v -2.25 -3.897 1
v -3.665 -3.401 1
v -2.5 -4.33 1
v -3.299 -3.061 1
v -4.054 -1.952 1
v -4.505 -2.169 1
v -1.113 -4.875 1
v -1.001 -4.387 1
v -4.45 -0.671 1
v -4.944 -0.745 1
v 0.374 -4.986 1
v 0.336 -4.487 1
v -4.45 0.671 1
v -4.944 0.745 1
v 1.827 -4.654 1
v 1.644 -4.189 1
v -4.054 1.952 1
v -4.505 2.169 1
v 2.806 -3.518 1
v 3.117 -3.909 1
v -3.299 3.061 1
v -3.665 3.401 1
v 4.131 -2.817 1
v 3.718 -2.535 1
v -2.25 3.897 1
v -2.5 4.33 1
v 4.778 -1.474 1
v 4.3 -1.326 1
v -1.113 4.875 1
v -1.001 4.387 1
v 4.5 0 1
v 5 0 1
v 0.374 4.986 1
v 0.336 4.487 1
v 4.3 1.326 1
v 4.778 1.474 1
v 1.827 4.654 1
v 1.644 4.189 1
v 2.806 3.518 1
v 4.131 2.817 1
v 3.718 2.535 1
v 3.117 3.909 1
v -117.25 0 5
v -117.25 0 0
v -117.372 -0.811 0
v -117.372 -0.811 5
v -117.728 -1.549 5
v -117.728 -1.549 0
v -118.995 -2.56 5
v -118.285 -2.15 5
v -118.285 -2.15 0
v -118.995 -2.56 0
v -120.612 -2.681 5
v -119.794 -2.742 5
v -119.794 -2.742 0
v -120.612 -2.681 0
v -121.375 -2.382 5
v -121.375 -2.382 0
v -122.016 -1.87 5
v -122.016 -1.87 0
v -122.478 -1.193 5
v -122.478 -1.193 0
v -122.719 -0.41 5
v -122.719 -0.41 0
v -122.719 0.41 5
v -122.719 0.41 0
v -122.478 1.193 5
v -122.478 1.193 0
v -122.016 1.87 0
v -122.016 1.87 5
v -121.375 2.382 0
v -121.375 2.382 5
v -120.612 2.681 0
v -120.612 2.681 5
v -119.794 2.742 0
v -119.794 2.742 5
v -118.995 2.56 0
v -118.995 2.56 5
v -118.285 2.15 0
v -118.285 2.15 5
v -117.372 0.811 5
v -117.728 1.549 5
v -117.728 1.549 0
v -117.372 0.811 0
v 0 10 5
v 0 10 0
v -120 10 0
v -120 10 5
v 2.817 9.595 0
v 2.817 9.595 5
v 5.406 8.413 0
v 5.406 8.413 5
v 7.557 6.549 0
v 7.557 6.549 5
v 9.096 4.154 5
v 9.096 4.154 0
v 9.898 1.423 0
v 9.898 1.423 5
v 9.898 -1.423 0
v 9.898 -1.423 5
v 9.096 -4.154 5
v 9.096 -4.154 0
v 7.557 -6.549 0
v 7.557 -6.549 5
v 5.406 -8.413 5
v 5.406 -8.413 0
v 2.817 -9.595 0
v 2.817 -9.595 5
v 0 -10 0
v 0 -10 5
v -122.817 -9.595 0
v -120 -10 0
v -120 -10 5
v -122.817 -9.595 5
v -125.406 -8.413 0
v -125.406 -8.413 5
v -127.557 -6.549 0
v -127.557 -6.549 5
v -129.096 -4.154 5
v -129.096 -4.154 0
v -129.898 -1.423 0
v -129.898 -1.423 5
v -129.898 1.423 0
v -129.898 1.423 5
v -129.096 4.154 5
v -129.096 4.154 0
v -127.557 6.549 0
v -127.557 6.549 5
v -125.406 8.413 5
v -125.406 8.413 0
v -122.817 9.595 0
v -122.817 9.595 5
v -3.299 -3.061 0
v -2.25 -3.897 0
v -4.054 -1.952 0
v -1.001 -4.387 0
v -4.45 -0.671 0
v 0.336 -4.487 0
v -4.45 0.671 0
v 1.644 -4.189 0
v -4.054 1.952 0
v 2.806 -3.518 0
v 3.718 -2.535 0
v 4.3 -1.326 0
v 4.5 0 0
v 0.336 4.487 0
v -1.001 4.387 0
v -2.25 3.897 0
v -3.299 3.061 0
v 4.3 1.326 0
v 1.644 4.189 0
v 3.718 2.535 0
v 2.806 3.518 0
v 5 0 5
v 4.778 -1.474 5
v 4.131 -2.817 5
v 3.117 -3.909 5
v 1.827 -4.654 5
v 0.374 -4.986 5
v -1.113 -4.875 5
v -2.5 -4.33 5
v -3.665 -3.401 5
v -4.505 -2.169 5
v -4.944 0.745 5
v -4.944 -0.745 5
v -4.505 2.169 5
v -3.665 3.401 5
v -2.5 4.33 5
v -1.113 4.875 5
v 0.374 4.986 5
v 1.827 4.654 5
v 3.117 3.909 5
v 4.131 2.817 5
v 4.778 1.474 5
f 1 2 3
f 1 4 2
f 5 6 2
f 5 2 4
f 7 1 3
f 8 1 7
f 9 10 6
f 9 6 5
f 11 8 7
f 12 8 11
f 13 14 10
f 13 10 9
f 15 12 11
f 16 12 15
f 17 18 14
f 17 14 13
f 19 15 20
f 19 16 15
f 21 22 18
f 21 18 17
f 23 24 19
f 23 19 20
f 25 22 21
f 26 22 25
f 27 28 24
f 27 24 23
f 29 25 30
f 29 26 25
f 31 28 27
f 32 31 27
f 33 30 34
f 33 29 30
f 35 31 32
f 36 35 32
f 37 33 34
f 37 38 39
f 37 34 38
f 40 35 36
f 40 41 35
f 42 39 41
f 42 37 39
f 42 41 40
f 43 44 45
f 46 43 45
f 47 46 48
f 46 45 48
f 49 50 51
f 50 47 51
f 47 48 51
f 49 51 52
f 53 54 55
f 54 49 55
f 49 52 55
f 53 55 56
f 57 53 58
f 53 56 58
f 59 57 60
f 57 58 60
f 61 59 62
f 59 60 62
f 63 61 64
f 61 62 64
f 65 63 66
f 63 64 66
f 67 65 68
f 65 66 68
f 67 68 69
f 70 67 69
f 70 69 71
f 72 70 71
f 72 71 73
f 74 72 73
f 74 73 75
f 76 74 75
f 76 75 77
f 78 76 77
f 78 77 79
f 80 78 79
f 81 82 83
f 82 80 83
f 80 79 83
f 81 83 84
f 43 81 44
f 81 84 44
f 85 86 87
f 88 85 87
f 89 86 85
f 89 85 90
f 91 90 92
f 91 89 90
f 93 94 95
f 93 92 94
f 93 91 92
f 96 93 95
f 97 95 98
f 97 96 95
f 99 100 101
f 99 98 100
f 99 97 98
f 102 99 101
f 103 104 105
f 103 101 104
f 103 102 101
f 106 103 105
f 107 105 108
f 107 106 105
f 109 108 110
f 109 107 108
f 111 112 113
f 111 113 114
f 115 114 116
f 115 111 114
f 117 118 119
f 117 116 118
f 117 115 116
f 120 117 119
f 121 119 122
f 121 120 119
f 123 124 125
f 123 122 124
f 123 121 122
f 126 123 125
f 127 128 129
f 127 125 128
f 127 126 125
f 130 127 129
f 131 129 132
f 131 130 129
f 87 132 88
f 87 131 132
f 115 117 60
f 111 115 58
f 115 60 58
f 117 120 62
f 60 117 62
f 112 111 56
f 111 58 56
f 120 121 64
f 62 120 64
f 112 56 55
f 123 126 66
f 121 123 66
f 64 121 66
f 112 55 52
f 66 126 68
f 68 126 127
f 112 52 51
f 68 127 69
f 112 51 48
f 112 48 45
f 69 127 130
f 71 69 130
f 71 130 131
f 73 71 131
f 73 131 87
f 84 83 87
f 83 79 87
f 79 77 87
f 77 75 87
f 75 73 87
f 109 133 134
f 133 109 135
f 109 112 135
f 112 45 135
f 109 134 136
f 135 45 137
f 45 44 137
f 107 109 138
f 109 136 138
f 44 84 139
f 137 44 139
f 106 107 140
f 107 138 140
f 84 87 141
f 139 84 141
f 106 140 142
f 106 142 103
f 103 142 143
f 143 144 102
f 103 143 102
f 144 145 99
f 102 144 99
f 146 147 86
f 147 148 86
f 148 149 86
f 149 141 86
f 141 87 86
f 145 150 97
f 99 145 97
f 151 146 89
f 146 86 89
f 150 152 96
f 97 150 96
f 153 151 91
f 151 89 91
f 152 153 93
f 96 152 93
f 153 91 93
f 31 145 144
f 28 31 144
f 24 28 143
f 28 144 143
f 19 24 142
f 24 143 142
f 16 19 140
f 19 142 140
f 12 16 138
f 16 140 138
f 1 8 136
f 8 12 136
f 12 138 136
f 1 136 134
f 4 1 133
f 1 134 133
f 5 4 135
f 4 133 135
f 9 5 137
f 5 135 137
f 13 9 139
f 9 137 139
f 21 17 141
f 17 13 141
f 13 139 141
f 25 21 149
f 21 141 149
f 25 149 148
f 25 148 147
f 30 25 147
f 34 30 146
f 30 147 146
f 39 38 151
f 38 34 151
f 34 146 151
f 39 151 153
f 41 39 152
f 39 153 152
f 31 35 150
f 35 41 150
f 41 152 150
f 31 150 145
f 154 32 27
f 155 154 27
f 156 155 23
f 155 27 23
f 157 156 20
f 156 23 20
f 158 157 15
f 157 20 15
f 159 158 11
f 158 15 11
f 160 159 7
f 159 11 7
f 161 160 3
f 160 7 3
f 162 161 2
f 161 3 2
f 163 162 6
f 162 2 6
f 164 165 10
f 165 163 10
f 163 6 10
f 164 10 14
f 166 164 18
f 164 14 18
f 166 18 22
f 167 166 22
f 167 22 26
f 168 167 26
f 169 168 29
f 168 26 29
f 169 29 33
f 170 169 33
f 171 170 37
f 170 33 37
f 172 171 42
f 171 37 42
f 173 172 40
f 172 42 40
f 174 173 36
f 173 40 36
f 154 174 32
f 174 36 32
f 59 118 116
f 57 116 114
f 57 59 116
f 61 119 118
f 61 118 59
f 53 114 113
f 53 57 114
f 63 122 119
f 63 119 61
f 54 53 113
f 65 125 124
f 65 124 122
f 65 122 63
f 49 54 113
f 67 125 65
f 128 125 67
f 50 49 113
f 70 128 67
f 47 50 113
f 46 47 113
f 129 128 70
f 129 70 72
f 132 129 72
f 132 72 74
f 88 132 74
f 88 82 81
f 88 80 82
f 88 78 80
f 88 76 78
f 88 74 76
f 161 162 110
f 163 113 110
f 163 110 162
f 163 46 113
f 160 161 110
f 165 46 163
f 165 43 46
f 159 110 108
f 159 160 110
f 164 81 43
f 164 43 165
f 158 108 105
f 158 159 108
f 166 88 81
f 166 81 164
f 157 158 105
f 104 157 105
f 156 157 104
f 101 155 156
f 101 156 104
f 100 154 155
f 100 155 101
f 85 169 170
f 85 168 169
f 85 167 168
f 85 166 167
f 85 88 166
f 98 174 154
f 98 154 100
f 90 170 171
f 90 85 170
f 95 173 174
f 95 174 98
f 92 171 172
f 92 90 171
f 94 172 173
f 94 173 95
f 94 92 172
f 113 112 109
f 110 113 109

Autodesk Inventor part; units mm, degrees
ref_plane "YZ Plane" through (0, 0, 0) normal (1, 0, 0) x (0, 1, 0)
ref_plane "XZ Plane" through (0, 0, 0) normal (0, 1, 0) x (-1, 0, 0)
ref_plane "XY Plane" through (0, 0, 0) normal (0, 0, 1) x (1, 0, 0)
sketch "Skizze3" plane through (0, 0, 0) normal (0, 0, 1) x (1, 0, 0)
  line L0 (0, 0) -> (-120, 0) construction
  line L1 (0, 10) -> (-120, 10)
  line L2 (-120, -10) -> (0, -10)
  arc A0 (0, -10) -> (0, 10) centre (0, 0) ccw
  arc A1 (-120, 10) -> (-120, -10) centre (-120, 0) ccw
  circle A2 centre (0, 0) radius 5
  circle A3 centre (-120, 0) radius 2.75
  circle A4 centre (0, 0) radius 4.5
  point P0 (-60, 0)
  dimension "d4" = 120
  dimension "d5" = 20
  dimension "d6" = 10
  dimension "d7" = 5.5
  dimension "d12" = 9
extrude "Extrusion3" add sketch "Skizze3" along normal blind 5 contours A0 L2 A1 L1
extrude "Extrusion4" add sketch "Skizze3" along normal blind 1 contours A2
equation "\"d4\" = Gelenk_einfach"
equation "\"Gelenk_einfach\" = 120"
properties part number "BT001_trajan20_21" material "Kunststoff, undurchsichtig Schwarz"
